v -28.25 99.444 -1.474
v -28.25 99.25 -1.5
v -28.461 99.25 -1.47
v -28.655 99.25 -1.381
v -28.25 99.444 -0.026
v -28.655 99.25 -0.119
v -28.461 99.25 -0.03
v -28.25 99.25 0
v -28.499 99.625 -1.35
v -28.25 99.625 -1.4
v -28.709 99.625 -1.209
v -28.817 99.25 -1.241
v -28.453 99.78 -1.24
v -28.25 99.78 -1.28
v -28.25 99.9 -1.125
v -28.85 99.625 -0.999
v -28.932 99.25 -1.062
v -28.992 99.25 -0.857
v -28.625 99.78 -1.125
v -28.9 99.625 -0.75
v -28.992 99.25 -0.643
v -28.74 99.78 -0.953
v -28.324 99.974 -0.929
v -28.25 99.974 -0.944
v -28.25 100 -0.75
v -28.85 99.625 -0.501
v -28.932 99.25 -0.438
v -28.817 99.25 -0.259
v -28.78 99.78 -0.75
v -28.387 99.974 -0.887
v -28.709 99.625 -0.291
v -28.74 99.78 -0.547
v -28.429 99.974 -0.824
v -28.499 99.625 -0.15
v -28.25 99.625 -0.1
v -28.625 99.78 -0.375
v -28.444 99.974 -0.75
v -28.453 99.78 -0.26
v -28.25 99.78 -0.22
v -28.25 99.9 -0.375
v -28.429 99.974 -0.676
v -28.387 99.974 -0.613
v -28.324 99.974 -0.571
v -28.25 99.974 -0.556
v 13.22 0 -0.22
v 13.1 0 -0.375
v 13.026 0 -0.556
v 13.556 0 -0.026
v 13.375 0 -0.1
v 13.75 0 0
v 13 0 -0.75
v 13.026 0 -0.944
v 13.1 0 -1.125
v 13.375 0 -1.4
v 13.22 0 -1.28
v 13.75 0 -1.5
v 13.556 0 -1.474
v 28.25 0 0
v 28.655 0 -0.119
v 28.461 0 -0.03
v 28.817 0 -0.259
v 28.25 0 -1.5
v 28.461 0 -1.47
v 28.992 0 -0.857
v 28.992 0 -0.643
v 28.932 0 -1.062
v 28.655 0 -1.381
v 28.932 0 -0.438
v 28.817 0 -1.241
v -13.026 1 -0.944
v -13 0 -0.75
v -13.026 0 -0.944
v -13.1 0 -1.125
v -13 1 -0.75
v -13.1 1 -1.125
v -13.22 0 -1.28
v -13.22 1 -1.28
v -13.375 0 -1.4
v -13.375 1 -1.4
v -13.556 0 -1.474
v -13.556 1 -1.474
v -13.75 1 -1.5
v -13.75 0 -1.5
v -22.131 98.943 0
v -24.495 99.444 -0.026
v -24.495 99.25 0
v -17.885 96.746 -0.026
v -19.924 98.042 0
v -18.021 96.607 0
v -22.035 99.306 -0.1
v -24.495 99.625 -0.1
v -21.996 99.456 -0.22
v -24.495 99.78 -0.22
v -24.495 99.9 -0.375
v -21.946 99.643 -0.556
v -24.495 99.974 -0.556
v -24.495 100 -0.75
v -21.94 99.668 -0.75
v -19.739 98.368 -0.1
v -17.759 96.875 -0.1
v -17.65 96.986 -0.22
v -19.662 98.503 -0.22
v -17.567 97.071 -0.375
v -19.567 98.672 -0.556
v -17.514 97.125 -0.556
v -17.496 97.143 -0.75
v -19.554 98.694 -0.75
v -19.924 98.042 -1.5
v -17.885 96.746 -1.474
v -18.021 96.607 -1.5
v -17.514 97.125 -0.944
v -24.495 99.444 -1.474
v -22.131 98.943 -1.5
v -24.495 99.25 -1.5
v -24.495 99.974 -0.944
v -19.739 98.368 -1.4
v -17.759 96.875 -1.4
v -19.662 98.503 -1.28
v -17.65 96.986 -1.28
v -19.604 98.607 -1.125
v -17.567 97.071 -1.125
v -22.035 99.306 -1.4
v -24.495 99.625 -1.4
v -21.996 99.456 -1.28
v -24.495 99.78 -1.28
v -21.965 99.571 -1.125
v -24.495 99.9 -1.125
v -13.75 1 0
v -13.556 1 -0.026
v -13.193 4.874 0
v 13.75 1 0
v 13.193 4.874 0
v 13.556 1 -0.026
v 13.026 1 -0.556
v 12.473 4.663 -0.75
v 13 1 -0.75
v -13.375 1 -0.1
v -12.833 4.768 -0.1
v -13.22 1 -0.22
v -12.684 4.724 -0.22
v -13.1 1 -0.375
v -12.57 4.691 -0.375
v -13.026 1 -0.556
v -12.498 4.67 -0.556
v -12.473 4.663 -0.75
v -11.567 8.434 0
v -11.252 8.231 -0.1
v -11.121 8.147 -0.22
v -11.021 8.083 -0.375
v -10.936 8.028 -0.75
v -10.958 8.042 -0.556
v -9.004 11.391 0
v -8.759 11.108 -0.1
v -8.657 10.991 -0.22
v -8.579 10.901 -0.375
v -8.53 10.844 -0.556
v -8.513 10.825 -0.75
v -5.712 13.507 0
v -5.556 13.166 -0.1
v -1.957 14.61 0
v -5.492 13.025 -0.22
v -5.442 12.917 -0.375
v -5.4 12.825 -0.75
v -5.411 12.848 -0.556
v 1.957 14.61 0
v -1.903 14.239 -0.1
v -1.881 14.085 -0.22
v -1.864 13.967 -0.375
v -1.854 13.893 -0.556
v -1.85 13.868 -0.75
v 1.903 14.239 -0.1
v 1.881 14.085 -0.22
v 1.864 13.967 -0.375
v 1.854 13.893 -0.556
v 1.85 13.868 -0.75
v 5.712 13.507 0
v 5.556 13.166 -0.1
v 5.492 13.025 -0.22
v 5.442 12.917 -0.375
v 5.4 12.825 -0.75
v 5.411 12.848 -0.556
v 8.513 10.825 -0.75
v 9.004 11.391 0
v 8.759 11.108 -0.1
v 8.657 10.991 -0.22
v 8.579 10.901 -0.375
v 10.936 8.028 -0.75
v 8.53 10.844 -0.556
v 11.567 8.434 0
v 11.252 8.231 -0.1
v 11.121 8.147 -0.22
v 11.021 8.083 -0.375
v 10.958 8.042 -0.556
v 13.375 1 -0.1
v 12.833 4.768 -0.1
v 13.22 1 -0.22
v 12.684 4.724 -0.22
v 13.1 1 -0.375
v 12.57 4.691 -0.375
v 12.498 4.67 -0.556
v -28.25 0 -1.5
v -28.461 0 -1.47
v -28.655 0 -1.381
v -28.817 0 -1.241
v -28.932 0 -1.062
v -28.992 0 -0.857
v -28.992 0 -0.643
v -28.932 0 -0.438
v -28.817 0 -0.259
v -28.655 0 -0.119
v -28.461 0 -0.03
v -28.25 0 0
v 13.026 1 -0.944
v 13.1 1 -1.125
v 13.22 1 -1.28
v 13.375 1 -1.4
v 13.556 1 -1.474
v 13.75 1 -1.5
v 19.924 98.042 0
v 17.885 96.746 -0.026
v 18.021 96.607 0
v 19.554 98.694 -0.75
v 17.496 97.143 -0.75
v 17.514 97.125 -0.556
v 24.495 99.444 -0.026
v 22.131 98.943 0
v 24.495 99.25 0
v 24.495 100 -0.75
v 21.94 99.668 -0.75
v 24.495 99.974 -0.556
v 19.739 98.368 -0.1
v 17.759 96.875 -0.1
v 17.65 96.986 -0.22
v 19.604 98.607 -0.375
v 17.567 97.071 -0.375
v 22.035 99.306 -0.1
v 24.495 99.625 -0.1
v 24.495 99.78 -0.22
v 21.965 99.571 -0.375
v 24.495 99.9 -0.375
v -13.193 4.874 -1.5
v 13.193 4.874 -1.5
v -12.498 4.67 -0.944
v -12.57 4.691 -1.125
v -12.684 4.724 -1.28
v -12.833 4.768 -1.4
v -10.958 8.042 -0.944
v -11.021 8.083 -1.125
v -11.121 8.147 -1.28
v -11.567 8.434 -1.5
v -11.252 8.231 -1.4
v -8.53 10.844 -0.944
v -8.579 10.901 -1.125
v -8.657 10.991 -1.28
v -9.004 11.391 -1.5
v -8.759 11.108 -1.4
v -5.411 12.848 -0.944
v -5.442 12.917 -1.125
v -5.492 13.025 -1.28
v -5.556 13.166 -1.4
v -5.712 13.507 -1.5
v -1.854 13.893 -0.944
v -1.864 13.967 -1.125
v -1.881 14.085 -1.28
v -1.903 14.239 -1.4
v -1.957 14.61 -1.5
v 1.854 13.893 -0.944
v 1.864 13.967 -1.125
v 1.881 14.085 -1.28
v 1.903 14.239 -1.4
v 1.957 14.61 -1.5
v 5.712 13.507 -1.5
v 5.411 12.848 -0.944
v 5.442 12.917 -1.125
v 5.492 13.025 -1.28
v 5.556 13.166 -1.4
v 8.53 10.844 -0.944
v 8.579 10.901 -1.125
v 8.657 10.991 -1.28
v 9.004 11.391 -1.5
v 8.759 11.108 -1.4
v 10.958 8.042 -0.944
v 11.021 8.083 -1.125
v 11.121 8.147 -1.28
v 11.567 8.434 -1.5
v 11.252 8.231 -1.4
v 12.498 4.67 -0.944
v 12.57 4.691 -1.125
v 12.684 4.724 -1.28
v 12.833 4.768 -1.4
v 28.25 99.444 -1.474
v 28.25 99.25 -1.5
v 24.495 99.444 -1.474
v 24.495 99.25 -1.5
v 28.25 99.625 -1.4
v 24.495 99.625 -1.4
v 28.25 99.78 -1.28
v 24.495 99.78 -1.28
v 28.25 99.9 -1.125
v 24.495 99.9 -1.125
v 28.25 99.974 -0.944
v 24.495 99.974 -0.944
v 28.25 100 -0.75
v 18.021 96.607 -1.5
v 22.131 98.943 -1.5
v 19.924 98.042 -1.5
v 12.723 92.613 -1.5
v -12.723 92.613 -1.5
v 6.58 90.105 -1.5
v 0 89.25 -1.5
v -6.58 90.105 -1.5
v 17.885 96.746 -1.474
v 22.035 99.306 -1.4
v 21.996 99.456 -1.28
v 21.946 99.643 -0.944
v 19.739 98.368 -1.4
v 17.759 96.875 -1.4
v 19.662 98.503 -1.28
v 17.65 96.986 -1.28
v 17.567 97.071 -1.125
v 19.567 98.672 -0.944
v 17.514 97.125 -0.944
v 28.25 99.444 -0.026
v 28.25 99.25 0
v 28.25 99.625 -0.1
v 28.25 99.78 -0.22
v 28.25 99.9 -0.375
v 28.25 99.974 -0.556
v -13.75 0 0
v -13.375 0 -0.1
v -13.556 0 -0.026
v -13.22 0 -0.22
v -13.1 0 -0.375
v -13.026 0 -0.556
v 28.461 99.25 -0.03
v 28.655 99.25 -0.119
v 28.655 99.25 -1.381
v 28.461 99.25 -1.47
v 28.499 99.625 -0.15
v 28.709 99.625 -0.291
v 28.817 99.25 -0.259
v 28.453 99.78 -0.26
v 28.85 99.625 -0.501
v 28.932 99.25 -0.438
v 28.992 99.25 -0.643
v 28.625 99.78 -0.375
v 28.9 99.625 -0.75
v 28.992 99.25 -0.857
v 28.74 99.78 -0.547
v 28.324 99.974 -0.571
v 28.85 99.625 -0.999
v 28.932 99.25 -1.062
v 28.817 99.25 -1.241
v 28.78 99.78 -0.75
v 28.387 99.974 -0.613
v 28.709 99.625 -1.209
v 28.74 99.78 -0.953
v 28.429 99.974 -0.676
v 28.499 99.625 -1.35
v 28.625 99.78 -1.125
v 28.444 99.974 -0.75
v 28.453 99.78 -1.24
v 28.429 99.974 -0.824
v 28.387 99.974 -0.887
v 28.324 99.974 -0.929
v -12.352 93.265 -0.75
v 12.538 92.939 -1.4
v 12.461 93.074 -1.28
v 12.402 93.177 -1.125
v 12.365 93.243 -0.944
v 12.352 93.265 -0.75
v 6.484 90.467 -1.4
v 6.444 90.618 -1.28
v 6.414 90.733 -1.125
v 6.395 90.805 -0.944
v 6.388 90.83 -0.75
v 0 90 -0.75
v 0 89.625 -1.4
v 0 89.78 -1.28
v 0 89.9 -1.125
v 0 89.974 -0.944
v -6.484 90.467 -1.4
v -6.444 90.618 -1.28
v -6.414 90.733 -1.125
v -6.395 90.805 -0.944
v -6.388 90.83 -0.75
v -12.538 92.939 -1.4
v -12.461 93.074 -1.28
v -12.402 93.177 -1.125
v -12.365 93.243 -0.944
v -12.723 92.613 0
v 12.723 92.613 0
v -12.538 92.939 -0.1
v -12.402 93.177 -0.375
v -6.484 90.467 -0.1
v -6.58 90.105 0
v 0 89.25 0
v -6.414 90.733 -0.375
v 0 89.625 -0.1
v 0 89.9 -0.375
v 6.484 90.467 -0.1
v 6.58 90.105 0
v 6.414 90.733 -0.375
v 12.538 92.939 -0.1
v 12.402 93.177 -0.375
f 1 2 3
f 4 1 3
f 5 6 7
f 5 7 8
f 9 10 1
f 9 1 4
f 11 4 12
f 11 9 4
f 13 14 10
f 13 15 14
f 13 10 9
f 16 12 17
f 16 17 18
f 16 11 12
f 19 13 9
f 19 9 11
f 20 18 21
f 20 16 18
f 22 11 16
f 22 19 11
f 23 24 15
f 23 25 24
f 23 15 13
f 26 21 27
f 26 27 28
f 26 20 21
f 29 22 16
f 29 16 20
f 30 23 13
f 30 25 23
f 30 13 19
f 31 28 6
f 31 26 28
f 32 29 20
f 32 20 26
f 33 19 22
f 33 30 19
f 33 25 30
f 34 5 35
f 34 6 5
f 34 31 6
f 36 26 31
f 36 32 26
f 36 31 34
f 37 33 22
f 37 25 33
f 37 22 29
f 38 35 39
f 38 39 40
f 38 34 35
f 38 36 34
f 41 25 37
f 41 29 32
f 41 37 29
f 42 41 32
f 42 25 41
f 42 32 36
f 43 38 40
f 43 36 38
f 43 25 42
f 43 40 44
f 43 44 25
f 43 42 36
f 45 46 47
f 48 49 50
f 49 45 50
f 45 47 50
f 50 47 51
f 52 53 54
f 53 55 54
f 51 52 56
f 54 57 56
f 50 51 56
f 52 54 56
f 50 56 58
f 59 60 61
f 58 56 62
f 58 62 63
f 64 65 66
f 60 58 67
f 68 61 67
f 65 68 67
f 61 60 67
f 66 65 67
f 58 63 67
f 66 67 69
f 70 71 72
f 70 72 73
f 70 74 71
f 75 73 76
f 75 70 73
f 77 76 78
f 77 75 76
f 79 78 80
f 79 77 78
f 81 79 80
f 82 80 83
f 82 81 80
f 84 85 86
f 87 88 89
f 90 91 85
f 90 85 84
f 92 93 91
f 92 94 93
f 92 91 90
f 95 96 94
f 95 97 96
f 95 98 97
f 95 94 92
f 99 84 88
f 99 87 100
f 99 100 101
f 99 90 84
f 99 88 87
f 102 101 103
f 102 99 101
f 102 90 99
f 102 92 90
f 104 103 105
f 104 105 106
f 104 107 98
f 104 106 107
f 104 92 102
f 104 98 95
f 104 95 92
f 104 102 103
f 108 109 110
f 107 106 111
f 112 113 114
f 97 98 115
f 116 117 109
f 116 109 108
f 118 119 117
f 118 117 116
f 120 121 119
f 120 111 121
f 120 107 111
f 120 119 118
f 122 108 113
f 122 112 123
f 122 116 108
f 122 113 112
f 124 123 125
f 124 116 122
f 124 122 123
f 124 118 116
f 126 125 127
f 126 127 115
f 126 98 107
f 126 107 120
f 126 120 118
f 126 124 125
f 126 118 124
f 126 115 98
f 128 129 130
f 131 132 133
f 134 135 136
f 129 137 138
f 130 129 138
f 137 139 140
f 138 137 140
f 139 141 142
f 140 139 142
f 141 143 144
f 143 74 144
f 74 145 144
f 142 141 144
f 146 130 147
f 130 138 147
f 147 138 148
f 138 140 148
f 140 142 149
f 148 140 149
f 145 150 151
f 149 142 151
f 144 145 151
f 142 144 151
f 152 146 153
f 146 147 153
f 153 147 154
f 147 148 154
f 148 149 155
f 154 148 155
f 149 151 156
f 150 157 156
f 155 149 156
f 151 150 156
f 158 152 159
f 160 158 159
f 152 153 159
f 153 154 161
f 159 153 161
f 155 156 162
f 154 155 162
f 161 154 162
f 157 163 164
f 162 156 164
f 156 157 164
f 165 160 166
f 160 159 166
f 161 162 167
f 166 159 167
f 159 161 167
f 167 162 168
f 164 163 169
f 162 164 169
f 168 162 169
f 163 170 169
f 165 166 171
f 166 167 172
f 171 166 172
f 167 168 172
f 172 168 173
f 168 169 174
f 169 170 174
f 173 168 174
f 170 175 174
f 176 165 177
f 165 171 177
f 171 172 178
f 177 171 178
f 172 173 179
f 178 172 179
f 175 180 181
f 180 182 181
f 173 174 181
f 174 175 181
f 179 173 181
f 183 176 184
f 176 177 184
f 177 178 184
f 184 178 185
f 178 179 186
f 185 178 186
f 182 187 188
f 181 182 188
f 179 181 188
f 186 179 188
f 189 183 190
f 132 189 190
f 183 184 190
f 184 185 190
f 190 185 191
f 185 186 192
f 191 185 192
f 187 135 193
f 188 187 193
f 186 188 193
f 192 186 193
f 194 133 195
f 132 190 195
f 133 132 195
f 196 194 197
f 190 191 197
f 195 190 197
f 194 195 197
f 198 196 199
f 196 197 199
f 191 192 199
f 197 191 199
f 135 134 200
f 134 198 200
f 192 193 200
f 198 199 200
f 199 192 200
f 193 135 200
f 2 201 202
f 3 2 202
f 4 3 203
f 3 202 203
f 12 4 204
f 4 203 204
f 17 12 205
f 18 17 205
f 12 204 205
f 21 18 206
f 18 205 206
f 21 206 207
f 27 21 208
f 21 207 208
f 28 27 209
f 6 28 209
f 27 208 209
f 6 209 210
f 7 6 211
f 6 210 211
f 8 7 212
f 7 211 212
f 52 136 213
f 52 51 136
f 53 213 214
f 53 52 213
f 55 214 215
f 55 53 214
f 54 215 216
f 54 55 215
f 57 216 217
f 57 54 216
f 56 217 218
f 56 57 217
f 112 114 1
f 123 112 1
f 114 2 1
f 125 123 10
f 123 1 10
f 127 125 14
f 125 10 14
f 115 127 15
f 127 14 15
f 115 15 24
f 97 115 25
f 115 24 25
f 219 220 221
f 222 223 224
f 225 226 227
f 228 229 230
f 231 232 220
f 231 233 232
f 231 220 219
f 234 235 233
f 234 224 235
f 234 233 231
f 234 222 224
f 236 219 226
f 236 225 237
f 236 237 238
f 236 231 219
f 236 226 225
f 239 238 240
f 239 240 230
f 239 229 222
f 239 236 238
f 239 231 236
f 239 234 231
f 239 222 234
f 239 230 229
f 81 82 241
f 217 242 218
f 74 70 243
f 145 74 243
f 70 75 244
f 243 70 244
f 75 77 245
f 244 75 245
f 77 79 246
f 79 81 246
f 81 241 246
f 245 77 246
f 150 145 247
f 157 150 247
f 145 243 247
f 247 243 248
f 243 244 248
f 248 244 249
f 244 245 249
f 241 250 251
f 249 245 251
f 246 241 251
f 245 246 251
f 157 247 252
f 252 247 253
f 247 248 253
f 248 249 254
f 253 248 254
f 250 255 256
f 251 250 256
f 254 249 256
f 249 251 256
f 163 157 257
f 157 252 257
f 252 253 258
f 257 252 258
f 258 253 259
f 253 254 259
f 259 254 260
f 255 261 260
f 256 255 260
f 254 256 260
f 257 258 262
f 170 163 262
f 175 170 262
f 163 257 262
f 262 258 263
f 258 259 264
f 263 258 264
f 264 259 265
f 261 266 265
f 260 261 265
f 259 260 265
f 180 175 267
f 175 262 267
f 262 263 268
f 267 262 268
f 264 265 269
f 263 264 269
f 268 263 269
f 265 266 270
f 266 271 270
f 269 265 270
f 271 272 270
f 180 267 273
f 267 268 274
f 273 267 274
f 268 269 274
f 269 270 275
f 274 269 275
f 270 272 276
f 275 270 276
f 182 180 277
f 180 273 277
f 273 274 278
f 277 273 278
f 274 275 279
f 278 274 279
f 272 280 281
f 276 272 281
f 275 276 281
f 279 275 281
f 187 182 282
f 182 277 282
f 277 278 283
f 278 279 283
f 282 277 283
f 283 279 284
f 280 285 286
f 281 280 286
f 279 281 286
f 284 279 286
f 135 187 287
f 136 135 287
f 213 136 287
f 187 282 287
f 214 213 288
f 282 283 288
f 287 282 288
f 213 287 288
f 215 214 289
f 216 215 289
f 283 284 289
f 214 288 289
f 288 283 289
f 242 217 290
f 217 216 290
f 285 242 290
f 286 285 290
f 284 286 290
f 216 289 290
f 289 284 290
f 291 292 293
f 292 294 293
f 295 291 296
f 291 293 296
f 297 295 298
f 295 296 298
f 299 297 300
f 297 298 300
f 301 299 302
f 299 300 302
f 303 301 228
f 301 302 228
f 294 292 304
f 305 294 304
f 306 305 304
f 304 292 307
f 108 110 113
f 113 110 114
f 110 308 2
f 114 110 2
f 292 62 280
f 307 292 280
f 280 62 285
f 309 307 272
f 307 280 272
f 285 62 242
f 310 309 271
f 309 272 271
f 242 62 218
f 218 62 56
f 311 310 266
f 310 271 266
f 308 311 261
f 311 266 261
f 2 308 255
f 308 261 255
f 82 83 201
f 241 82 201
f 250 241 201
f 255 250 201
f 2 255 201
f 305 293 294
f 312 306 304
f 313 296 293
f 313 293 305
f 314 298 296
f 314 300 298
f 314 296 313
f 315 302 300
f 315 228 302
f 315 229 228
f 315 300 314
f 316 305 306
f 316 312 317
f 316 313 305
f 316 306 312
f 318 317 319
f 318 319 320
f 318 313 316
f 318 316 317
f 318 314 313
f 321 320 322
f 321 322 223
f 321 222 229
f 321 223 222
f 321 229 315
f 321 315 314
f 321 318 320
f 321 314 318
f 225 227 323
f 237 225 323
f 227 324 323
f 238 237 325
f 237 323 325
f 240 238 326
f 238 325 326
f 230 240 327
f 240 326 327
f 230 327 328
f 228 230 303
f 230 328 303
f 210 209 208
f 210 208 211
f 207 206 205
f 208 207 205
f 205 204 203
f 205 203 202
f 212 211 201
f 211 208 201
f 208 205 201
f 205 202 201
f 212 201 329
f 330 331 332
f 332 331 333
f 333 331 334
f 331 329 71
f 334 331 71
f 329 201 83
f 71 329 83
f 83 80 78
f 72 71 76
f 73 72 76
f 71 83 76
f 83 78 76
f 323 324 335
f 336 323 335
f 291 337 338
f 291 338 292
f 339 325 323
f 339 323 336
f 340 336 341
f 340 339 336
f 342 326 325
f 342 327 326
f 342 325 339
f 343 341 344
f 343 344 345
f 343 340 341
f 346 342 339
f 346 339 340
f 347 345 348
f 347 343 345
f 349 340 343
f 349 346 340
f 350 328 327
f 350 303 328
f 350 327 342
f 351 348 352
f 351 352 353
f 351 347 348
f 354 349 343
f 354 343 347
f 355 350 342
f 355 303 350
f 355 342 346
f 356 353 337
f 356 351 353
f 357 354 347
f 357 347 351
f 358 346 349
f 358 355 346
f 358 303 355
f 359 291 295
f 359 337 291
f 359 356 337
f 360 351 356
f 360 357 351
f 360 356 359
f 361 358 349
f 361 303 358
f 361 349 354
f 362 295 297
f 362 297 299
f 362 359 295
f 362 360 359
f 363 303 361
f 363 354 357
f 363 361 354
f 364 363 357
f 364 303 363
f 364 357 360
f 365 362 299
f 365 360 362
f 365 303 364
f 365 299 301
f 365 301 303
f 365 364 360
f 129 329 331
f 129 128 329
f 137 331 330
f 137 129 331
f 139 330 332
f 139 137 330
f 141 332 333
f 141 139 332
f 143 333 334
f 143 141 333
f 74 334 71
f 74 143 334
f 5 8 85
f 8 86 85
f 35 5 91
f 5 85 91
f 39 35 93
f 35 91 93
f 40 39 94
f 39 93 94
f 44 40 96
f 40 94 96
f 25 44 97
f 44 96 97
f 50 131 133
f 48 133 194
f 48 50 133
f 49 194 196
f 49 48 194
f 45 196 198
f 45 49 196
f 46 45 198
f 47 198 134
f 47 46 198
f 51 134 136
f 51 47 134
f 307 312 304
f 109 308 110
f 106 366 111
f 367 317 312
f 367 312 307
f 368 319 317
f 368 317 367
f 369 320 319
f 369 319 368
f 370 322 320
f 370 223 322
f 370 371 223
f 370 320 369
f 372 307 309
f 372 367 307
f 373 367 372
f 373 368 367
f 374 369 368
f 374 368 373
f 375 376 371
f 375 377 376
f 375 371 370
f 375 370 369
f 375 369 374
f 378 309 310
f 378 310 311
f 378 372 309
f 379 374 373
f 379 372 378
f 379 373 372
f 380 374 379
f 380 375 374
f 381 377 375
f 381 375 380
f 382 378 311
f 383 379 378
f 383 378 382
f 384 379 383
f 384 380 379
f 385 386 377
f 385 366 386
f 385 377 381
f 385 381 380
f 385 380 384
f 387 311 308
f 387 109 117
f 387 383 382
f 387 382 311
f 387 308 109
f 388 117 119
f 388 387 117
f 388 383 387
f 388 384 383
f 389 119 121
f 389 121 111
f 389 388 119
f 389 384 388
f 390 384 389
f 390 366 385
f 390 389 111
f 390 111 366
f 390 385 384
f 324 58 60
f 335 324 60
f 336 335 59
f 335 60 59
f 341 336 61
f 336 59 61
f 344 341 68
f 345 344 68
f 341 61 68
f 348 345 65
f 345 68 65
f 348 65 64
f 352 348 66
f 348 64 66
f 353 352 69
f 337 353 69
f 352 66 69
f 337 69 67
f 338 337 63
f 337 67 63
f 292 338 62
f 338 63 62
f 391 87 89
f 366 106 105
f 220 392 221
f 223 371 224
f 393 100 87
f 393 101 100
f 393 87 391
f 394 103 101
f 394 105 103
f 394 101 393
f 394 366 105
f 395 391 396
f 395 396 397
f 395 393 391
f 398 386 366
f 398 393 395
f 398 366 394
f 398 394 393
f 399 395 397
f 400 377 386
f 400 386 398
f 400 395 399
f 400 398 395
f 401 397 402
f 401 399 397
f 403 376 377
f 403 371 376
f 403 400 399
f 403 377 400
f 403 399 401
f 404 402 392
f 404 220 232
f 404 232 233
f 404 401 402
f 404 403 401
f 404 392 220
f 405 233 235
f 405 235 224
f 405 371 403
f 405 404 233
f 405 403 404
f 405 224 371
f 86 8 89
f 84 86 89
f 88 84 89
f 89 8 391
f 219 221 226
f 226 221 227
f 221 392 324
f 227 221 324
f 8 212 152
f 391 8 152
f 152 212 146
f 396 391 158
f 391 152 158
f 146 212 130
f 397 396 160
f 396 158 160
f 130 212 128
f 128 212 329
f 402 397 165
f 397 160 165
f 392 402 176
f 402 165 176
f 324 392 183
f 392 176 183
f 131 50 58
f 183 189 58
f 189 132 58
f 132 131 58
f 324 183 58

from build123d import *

# Parameters (mm, degrees)
BOSS_EXTRUDE1_DEPTH     = 100
CUT_EXTRUDE1_DEPTH      = 105.130927202
CUT_EXTRUDE1_DEPTH_BACK = 105.130927202
CUT_EXTRUDE2_DEPTH      = 10
FILLET6_R               = 10
FILLET7_R               = 10
FILLET13_R              = 0.75
FILLET14_R              = 0.75


with BuildPart() as part:
    # Sketch1 → Boss-Extrude1 (new body)
    with BuildSketch(Plane(origin=(0, 0, 0), x_dir=(1, 0, 0), z_dir=(0, 1, 0))):
        with BuildLine():
            Line((-28.25, 0), (28.25, 0))
            ThreePointArc((28.25, 0), (29, 0.75), (28.25, 1.5))
            Line((28.25, 1.5), (-28.25, 1.5))
            ThreePointArc((-28.25, 1.5), (-29, 0.75), (-28.25, 0))
        make_face()
    extrude(amount=BOSS_EXTRUDE1_DEPTH)

    # Sketch2 → Cut-Extrude1 (cut, two sides: drawn at the far end of the back side and taken through both)
    with BuildSketch(Plane.XY.offset(-CUT_EXTRUDE1_DEPTH_BACK)):
        with BuildLine():
            Line((-20, 100), (20, 100))
            ThreePointArc((20, 100), (0, 90), (-20, 100))
        make_face()
    extrude(amount=CUT_EXTRUDE1_DEPTH + CUT_EXTRUDE1_DEPTH_BACK, mode=Mode.SUBTRACT)

    # Sketch3 → Cut-Extrude2 (cut)
    with BuildSketch(Plane.XY):
        with BuildLine():
            Line((13, 1), (13, 0))
            Line((13, 0), (-13, 0))
            Line((-13, 0), (-13, 1))
            ThreePointArc((-13, 1), (0, 14), (13, 1))
        make_face()
    extrude(amount=-CUT_EXTRUDE2_DEPTH, mode=Mode.SUBTRACT)

    # Fillet6
    fillet6_edges = [part.edges().sort_by_distance(p)[0] for p in [
        (-20, 100, -0.75),
    ]]
    fillet(fillet6_edges, radius=FILLET6_R)

    # Fillet7
    fillet7_edges = [part.edges().sort_by_distance(p)[0] for p in [
        (20, 100, -0.75),
    ]]
    fillet(fillet7_edges, radius=FILLET7_R)

    # Fillet13
    fillet13_edges = [part.edges().sort_by_distance(p)[0] for p in [
        (20.715252698, 99.258200998, 0),
        (-20.715252698, 99.258200998, 0),
        (20.715252698, 99.258200998, -1.5),
        (-20.715252698, 99.258200998, -1.5),
        (29, 100, -0.75),
        (26.372448714, 100, 0),
        (26.372448714, 100, -1.5),
        (0, 90, -1.5),
        (0, 90, 0),
        (-29, 100, -0.75),
        (-26.372448714, 100, -1.5),
        (-26.372448714, 100, 0),
    ]]
    fillet(fillet13_edges, radius=FILLET13_R - 0.0001)  # a hair under: the kernel refuses the full size

    # Fillet14
    fillet14_edges = [part.edges().sort_by_distance(p)[0] for p in [
        (13, 0.5, -1.5),
        (-13, 0.5, -1.5),
        (13, 0.5, 0),
        (-13, 0.5, 0),
        (0, 14, -1.5),
        (0, 14, 0),
    ]]
    fillet(fillet14_edges, radius=FILLET14_R - 0.0001)  # a hair under: the kernel refuses the full size


solid = part.part
